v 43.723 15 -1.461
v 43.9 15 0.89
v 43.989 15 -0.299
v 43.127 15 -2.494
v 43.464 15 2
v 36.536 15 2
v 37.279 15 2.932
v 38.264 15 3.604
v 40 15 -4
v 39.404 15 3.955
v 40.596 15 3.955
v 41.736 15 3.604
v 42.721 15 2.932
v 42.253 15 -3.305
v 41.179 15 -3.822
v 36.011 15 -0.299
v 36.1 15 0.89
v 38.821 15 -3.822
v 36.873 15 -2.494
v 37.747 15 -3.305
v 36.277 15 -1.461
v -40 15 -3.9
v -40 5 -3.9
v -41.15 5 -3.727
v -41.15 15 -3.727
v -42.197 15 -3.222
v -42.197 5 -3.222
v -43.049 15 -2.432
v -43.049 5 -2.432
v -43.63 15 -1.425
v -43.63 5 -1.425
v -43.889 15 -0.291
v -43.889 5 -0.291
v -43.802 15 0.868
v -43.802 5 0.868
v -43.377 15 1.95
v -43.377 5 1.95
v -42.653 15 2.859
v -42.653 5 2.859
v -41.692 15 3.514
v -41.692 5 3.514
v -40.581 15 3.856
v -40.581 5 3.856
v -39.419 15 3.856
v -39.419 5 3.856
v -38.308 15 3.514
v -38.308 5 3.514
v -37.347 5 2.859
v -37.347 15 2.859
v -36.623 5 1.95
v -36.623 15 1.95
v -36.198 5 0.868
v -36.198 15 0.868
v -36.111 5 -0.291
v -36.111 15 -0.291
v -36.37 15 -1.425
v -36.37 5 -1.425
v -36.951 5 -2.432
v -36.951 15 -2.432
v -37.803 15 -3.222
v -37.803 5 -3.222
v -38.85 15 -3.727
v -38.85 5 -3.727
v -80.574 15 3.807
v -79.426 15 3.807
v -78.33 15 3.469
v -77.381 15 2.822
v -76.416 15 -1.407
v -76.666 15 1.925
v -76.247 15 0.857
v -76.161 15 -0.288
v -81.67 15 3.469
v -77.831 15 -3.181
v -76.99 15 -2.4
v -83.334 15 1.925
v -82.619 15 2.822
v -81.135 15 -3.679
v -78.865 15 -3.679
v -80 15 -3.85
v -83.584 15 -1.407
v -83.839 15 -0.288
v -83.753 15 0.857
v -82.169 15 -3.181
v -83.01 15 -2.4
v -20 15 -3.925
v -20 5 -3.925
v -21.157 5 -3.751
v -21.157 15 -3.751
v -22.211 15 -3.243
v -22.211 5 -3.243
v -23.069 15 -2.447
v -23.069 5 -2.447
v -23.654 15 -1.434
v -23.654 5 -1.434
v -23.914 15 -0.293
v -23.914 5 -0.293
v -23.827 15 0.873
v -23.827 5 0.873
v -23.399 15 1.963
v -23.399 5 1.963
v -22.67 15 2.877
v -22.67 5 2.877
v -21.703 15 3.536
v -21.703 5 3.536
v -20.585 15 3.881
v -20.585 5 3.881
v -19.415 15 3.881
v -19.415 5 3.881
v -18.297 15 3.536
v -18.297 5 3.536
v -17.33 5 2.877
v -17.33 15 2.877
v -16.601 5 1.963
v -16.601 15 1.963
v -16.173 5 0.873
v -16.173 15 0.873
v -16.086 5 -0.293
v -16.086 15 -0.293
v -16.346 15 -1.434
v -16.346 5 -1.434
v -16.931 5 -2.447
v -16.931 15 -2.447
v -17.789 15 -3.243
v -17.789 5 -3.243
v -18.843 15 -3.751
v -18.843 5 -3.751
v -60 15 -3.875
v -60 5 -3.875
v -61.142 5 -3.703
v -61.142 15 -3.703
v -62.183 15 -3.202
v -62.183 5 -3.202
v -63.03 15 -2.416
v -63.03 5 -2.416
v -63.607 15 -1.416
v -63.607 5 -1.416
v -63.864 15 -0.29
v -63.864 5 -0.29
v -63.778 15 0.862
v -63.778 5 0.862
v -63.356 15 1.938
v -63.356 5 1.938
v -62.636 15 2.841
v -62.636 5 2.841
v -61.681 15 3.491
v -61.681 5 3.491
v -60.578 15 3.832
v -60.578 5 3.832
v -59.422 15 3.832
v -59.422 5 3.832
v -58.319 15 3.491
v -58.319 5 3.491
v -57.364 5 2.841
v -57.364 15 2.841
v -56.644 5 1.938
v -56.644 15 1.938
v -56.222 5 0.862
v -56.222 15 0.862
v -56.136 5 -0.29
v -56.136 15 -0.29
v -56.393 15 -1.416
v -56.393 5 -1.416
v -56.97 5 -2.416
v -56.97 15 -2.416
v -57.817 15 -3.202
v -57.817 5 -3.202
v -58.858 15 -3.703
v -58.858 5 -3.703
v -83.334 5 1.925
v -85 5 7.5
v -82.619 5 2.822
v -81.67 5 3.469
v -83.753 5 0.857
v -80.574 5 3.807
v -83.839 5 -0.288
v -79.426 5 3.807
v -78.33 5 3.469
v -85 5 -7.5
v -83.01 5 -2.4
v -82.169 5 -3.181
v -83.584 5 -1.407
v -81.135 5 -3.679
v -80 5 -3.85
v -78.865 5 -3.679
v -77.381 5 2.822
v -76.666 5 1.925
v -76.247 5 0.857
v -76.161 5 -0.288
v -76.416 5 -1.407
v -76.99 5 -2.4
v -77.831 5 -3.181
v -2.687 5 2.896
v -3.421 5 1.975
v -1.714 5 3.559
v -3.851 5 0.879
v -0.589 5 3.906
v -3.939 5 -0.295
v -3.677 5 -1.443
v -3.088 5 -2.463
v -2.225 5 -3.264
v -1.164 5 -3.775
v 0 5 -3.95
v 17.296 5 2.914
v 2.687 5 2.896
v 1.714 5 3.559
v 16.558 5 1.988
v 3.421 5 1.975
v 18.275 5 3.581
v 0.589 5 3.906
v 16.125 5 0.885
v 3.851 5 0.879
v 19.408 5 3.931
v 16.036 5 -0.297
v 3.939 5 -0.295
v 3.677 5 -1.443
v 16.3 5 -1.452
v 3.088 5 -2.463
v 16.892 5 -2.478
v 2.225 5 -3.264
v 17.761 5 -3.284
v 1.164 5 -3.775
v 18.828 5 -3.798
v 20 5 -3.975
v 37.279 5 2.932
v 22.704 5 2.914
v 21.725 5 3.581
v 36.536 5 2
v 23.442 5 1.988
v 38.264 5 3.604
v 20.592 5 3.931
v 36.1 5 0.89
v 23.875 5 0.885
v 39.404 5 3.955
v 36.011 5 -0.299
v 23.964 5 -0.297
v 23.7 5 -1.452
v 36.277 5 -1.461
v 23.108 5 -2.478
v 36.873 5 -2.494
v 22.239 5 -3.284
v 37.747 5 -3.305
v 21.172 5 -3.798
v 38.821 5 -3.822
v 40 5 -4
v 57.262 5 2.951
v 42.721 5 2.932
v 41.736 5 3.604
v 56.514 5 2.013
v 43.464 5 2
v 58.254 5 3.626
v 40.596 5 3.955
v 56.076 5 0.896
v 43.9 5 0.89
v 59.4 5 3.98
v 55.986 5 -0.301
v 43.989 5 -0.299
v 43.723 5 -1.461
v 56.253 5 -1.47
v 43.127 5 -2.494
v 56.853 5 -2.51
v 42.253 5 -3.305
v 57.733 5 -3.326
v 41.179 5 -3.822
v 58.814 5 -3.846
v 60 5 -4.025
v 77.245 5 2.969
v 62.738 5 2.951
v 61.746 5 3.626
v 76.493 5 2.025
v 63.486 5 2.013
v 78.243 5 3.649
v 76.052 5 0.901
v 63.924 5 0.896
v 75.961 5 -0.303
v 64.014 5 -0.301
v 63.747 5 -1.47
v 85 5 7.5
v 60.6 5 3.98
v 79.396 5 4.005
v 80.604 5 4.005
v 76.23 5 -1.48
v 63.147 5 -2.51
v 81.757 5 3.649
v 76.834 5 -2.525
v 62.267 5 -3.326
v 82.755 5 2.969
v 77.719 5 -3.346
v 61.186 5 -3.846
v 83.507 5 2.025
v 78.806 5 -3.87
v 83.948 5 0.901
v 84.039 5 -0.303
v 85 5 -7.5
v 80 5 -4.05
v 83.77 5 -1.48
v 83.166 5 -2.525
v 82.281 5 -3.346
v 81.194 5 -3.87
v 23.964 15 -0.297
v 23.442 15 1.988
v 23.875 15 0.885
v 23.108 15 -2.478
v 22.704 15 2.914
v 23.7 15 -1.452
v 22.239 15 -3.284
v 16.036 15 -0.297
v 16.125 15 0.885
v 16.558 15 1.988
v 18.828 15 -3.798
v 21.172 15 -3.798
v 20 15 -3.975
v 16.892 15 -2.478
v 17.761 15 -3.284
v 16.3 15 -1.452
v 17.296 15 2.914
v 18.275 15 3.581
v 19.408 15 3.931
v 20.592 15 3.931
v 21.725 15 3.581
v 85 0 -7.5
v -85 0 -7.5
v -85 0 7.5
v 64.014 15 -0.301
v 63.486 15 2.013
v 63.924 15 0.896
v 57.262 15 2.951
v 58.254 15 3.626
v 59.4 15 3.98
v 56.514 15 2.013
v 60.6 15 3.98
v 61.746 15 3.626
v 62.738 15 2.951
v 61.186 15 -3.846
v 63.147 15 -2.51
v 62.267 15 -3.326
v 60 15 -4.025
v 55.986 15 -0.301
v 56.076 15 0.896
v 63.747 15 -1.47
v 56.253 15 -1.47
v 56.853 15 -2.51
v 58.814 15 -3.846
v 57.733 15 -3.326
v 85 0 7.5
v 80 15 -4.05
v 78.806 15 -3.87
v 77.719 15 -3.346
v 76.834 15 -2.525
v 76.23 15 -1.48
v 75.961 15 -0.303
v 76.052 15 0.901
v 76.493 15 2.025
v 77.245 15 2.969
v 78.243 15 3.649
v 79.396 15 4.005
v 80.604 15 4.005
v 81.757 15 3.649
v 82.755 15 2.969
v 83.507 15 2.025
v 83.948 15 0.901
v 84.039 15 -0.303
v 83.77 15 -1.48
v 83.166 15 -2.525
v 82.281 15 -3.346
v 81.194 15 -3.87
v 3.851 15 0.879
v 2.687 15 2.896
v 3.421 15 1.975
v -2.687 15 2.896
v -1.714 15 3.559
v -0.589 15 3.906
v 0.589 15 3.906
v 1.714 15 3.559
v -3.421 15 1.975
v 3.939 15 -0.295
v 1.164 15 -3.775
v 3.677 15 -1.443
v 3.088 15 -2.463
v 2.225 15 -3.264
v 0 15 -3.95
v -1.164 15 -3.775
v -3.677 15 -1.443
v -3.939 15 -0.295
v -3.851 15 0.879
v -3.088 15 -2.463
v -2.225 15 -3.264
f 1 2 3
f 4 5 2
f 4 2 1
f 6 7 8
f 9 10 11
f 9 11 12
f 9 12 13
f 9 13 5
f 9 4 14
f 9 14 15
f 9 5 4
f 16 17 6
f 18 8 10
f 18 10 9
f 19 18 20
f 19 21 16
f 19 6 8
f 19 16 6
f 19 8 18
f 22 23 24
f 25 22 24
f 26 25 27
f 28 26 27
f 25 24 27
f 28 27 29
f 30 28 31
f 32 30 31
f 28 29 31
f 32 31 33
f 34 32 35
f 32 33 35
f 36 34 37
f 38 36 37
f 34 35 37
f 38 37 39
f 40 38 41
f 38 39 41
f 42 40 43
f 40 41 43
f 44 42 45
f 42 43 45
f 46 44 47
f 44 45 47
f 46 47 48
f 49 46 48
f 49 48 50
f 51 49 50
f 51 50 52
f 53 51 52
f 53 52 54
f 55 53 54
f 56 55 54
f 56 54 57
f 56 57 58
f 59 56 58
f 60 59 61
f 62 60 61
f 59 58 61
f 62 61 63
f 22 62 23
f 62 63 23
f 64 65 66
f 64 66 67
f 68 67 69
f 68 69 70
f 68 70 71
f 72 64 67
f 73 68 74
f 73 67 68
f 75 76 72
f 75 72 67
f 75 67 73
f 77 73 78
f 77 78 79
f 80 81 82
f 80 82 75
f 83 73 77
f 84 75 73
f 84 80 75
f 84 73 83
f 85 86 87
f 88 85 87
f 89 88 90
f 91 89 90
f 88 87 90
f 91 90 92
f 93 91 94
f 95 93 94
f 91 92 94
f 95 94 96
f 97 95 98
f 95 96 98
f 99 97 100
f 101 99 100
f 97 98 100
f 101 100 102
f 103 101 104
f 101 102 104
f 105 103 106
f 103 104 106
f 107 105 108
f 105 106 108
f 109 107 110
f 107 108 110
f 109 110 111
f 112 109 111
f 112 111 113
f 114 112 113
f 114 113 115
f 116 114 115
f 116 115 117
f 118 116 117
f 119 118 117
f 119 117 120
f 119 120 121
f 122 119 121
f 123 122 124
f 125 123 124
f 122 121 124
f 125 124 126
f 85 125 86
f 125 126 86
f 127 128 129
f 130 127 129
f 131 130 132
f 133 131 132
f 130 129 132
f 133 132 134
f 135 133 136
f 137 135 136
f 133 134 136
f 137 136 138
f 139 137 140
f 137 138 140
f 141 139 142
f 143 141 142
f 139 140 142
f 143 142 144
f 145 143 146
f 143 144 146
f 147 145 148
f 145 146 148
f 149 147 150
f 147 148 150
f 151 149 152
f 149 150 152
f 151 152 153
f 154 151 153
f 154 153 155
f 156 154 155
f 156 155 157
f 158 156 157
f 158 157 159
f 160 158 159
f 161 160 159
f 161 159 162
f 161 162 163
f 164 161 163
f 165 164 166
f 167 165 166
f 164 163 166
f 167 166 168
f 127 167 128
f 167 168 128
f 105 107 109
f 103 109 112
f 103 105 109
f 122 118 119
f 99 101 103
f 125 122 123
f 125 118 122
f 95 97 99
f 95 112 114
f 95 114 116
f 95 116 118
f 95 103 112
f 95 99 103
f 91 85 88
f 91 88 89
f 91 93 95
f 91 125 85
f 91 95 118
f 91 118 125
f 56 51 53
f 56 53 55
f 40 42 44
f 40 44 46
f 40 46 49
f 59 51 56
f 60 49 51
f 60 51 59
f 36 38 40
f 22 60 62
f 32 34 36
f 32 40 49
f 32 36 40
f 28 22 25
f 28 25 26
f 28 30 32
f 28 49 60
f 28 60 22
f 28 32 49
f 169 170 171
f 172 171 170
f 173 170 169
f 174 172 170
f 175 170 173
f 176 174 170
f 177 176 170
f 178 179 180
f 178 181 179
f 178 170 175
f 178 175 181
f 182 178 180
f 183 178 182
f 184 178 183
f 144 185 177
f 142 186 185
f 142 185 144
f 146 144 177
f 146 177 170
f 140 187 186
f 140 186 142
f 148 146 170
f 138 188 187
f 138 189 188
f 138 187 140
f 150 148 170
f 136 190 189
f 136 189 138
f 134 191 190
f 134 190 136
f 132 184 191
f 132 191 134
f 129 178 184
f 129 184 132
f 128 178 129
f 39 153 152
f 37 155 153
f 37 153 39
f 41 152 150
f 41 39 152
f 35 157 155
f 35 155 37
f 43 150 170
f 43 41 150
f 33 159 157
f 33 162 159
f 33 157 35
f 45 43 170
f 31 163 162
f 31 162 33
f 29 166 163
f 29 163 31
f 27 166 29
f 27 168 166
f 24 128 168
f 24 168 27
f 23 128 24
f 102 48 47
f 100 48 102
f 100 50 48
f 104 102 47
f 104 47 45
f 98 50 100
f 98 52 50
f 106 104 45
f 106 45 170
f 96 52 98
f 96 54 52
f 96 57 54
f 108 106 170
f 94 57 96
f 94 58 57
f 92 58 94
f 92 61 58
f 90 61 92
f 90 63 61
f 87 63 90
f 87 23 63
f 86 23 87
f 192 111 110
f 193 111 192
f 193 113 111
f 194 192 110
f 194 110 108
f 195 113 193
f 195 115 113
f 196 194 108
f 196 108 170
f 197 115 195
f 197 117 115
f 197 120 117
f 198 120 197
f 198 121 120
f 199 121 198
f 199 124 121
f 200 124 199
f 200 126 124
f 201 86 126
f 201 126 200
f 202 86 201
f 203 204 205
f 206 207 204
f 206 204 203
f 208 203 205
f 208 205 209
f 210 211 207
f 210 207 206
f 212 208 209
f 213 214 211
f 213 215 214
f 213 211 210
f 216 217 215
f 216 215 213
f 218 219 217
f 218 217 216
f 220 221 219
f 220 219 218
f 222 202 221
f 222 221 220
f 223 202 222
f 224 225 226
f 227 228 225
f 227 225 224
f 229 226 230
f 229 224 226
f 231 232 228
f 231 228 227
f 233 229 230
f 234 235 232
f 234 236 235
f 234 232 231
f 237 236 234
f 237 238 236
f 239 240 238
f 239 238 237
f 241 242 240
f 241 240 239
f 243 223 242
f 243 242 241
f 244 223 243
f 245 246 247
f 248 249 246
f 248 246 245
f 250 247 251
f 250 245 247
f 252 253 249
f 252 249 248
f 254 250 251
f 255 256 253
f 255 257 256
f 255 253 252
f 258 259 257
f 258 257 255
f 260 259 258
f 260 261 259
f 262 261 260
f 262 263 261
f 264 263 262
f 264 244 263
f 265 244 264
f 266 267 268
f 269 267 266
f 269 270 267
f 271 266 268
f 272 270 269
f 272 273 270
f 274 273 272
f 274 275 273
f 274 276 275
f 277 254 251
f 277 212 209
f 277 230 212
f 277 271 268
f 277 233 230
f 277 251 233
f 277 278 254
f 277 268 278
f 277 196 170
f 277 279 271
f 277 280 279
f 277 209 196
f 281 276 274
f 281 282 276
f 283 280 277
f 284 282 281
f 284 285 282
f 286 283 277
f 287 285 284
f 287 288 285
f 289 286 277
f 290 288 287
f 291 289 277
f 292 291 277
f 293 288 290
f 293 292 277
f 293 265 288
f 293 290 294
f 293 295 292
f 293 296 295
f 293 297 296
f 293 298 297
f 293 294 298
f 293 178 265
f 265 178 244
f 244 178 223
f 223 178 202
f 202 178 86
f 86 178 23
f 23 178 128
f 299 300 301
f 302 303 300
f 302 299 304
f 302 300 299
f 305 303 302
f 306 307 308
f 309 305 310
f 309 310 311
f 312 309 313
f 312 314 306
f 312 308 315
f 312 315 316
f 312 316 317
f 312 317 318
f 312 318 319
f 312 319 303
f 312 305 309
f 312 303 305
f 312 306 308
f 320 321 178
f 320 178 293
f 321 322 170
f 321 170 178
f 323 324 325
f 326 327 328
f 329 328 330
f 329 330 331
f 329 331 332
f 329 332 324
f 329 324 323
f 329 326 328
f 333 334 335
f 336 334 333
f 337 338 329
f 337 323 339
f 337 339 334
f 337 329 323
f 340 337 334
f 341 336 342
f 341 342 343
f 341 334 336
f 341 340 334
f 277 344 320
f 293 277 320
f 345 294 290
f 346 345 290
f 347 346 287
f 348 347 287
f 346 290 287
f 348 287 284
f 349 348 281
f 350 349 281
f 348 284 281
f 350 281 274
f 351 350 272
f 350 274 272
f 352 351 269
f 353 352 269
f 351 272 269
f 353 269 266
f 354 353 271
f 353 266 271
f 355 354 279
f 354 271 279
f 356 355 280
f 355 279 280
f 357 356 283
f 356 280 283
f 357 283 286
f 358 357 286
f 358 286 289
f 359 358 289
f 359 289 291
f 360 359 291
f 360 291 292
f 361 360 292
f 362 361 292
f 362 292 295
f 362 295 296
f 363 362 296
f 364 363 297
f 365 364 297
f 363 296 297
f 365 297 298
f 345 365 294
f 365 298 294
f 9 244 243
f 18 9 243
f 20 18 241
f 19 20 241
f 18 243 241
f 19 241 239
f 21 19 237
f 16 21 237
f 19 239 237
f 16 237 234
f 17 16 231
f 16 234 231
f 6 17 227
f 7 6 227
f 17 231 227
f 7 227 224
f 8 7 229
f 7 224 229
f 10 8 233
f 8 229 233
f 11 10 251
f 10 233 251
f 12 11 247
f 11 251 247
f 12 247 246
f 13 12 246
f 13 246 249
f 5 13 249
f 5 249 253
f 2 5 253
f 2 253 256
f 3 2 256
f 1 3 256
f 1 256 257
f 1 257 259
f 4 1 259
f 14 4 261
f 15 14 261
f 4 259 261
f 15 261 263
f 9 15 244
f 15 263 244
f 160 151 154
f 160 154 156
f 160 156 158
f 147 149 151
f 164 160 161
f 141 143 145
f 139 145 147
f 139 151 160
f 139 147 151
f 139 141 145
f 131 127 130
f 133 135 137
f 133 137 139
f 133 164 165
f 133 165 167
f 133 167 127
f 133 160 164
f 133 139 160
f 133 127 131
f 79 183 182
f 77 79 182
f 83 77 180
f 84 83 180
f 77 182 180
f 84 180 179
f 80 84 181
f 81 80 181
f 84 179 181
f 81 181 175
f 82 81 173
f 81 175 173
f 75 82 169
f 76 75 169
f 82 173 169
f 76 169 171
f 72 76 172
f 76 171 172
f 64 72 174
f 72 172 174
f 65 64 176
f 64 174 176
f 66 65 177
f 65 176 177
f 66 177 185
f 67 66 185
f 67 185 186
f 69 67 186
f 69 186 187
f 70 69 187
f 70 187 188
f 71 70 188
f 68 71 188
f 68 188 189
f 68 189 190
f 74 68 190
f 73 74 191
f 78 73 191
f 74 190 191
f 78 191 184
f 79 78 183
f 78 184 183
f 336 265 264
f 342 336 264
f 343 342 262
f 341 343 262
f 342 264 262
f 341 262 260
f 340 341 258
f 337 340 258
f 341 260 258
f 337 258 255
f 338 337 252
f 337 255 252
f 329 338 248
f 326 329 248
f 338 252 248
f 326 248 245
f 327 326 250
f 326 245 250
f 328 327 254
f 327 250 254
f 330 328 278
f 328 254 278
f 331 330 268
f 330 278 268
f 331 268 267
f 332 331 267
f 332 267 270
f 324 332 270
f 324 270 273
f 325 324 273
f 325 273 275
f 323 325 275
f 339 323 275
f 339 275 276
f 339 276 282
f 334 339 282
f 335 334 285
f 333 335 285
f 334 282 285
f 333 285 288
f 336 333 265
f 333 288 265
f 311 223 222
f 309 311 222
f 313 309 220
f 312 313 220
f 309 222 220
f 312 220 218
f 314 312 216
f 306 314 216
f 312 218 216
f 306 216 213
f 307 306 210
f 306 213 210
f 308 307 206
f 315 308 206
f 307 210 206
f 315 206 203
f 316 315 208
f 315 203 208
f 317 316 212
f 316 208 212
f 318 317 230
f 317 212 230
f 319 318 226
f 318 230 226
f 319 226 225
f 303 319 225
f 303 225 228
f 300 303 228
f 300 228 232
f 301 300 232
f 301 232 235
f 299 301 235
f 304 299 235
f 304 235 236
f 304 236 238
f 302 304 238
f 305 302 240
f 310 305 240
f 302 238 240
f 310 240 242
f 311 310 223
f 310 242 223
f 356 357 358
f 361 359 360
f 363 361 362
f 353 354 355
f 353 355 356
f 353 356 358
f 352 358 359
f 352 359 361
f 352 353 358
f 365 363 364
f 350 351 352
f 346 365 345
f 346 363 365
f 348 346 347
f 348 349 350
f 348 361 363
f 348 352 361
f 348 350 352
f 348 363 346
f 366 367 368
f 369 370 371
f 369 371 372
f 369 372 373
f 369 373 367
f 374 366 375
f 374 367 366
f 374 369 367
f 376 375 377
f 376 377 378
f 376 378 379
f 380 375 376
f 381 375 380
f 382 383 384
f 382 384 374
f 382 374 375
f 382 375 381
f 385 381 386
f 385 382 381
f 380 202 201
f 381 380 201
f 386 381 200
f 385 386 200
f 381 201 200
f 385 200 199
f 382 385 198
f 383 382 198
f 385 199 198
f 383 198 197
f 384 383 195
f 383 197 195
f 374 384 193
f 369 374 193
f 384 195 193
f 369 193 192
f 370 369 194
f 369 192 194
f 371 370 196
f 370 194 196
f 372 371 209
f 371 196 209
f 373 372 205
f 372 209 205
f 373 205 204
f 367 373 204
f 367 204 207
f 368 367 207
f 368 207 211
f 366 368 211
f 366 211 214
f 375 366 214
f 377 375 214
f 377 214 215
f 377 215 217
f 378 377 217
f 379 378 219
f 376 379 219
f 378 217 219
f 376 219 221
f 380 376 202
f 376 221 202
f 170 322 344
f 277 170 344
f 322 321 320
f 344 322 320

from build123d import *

# Parameters (mm, degrees)
SKETCH_3_W      = 170
SKETCH_3_H      = 15
EXTRUDE_3_DEPTH = 5
SKETCH_4_R      = 3.85
SKETCH_4_R_2    = 3.875
SKETCH_4_R_3    = 3.9
SKETCH_4_R_4    = 3.925
SKETCH_4_R_5    = 3.95
SKETCH_4_R_6    = 3.975
SKETCH_4_R_7    = 4
SKETCH_4_R_8    = 4.025
SKETCH_4_R_9    = 4.05
EXTRUDE_4_DEPTH = 10


with BuildPart() as part:
    # 스케치3 → 보스-돌출3 (new body)
    with BuildSketch(Plane(origin=(0, 0, 0), x_dir=(1, 0, 0), z_dir=(0, 1, 0))):
        Rectangle(SKETCH_3_W, SKETCH_3_H)
    extrude(amount=EXTRUDE_3_DEPTH)

    # 스케치4 → 보스-돌출4 (add)
    with BuildSketch(Plane(origin=(0, 5, 0), x_dir=(1, 0, 0), z_dir=(0, 1, 0))):
        with Locations(Location((-80, 0, 0), (0, 0, 90))):
            Circle(SKETCH_4_R)
        with Locations(Location((-60, 0, 0), (0, 0, 90))):
            Circle(SKETCH_4_R_2)
        with Locations(Location((-40, 0, 0), (0, 0, 90))):
            Circle(SKETCH_4_R_3)
        with Locations(Location((-20, 0, 0), (0, 0, 90))):
            Circle(SKETCH_4_R_4)
        with Locations(Location((0, 0, 0), (0, 0, 90))):
            Circle(SKETCH_4_R_5)
        with Locations(Location((20, 0, 0), (0, 0, 90))):
            Circle(SKETCH_4_R_6)
        with Locations(Location((40, 0, 0), (0, 0, 90))):
            Circle(SKETCH_4_R_7)
        with Locations(Location((60, 0, 0), (0, 0, 90))):
            Circle(SKETCH_4_R_8)
        with Locations(Location((80, 0, 0), (0, 0, 90))):
            Circle(SKETCH_4_R_9)
    extrude(amount=EXTRUDE_4_DEPTH)


solid = part.part
